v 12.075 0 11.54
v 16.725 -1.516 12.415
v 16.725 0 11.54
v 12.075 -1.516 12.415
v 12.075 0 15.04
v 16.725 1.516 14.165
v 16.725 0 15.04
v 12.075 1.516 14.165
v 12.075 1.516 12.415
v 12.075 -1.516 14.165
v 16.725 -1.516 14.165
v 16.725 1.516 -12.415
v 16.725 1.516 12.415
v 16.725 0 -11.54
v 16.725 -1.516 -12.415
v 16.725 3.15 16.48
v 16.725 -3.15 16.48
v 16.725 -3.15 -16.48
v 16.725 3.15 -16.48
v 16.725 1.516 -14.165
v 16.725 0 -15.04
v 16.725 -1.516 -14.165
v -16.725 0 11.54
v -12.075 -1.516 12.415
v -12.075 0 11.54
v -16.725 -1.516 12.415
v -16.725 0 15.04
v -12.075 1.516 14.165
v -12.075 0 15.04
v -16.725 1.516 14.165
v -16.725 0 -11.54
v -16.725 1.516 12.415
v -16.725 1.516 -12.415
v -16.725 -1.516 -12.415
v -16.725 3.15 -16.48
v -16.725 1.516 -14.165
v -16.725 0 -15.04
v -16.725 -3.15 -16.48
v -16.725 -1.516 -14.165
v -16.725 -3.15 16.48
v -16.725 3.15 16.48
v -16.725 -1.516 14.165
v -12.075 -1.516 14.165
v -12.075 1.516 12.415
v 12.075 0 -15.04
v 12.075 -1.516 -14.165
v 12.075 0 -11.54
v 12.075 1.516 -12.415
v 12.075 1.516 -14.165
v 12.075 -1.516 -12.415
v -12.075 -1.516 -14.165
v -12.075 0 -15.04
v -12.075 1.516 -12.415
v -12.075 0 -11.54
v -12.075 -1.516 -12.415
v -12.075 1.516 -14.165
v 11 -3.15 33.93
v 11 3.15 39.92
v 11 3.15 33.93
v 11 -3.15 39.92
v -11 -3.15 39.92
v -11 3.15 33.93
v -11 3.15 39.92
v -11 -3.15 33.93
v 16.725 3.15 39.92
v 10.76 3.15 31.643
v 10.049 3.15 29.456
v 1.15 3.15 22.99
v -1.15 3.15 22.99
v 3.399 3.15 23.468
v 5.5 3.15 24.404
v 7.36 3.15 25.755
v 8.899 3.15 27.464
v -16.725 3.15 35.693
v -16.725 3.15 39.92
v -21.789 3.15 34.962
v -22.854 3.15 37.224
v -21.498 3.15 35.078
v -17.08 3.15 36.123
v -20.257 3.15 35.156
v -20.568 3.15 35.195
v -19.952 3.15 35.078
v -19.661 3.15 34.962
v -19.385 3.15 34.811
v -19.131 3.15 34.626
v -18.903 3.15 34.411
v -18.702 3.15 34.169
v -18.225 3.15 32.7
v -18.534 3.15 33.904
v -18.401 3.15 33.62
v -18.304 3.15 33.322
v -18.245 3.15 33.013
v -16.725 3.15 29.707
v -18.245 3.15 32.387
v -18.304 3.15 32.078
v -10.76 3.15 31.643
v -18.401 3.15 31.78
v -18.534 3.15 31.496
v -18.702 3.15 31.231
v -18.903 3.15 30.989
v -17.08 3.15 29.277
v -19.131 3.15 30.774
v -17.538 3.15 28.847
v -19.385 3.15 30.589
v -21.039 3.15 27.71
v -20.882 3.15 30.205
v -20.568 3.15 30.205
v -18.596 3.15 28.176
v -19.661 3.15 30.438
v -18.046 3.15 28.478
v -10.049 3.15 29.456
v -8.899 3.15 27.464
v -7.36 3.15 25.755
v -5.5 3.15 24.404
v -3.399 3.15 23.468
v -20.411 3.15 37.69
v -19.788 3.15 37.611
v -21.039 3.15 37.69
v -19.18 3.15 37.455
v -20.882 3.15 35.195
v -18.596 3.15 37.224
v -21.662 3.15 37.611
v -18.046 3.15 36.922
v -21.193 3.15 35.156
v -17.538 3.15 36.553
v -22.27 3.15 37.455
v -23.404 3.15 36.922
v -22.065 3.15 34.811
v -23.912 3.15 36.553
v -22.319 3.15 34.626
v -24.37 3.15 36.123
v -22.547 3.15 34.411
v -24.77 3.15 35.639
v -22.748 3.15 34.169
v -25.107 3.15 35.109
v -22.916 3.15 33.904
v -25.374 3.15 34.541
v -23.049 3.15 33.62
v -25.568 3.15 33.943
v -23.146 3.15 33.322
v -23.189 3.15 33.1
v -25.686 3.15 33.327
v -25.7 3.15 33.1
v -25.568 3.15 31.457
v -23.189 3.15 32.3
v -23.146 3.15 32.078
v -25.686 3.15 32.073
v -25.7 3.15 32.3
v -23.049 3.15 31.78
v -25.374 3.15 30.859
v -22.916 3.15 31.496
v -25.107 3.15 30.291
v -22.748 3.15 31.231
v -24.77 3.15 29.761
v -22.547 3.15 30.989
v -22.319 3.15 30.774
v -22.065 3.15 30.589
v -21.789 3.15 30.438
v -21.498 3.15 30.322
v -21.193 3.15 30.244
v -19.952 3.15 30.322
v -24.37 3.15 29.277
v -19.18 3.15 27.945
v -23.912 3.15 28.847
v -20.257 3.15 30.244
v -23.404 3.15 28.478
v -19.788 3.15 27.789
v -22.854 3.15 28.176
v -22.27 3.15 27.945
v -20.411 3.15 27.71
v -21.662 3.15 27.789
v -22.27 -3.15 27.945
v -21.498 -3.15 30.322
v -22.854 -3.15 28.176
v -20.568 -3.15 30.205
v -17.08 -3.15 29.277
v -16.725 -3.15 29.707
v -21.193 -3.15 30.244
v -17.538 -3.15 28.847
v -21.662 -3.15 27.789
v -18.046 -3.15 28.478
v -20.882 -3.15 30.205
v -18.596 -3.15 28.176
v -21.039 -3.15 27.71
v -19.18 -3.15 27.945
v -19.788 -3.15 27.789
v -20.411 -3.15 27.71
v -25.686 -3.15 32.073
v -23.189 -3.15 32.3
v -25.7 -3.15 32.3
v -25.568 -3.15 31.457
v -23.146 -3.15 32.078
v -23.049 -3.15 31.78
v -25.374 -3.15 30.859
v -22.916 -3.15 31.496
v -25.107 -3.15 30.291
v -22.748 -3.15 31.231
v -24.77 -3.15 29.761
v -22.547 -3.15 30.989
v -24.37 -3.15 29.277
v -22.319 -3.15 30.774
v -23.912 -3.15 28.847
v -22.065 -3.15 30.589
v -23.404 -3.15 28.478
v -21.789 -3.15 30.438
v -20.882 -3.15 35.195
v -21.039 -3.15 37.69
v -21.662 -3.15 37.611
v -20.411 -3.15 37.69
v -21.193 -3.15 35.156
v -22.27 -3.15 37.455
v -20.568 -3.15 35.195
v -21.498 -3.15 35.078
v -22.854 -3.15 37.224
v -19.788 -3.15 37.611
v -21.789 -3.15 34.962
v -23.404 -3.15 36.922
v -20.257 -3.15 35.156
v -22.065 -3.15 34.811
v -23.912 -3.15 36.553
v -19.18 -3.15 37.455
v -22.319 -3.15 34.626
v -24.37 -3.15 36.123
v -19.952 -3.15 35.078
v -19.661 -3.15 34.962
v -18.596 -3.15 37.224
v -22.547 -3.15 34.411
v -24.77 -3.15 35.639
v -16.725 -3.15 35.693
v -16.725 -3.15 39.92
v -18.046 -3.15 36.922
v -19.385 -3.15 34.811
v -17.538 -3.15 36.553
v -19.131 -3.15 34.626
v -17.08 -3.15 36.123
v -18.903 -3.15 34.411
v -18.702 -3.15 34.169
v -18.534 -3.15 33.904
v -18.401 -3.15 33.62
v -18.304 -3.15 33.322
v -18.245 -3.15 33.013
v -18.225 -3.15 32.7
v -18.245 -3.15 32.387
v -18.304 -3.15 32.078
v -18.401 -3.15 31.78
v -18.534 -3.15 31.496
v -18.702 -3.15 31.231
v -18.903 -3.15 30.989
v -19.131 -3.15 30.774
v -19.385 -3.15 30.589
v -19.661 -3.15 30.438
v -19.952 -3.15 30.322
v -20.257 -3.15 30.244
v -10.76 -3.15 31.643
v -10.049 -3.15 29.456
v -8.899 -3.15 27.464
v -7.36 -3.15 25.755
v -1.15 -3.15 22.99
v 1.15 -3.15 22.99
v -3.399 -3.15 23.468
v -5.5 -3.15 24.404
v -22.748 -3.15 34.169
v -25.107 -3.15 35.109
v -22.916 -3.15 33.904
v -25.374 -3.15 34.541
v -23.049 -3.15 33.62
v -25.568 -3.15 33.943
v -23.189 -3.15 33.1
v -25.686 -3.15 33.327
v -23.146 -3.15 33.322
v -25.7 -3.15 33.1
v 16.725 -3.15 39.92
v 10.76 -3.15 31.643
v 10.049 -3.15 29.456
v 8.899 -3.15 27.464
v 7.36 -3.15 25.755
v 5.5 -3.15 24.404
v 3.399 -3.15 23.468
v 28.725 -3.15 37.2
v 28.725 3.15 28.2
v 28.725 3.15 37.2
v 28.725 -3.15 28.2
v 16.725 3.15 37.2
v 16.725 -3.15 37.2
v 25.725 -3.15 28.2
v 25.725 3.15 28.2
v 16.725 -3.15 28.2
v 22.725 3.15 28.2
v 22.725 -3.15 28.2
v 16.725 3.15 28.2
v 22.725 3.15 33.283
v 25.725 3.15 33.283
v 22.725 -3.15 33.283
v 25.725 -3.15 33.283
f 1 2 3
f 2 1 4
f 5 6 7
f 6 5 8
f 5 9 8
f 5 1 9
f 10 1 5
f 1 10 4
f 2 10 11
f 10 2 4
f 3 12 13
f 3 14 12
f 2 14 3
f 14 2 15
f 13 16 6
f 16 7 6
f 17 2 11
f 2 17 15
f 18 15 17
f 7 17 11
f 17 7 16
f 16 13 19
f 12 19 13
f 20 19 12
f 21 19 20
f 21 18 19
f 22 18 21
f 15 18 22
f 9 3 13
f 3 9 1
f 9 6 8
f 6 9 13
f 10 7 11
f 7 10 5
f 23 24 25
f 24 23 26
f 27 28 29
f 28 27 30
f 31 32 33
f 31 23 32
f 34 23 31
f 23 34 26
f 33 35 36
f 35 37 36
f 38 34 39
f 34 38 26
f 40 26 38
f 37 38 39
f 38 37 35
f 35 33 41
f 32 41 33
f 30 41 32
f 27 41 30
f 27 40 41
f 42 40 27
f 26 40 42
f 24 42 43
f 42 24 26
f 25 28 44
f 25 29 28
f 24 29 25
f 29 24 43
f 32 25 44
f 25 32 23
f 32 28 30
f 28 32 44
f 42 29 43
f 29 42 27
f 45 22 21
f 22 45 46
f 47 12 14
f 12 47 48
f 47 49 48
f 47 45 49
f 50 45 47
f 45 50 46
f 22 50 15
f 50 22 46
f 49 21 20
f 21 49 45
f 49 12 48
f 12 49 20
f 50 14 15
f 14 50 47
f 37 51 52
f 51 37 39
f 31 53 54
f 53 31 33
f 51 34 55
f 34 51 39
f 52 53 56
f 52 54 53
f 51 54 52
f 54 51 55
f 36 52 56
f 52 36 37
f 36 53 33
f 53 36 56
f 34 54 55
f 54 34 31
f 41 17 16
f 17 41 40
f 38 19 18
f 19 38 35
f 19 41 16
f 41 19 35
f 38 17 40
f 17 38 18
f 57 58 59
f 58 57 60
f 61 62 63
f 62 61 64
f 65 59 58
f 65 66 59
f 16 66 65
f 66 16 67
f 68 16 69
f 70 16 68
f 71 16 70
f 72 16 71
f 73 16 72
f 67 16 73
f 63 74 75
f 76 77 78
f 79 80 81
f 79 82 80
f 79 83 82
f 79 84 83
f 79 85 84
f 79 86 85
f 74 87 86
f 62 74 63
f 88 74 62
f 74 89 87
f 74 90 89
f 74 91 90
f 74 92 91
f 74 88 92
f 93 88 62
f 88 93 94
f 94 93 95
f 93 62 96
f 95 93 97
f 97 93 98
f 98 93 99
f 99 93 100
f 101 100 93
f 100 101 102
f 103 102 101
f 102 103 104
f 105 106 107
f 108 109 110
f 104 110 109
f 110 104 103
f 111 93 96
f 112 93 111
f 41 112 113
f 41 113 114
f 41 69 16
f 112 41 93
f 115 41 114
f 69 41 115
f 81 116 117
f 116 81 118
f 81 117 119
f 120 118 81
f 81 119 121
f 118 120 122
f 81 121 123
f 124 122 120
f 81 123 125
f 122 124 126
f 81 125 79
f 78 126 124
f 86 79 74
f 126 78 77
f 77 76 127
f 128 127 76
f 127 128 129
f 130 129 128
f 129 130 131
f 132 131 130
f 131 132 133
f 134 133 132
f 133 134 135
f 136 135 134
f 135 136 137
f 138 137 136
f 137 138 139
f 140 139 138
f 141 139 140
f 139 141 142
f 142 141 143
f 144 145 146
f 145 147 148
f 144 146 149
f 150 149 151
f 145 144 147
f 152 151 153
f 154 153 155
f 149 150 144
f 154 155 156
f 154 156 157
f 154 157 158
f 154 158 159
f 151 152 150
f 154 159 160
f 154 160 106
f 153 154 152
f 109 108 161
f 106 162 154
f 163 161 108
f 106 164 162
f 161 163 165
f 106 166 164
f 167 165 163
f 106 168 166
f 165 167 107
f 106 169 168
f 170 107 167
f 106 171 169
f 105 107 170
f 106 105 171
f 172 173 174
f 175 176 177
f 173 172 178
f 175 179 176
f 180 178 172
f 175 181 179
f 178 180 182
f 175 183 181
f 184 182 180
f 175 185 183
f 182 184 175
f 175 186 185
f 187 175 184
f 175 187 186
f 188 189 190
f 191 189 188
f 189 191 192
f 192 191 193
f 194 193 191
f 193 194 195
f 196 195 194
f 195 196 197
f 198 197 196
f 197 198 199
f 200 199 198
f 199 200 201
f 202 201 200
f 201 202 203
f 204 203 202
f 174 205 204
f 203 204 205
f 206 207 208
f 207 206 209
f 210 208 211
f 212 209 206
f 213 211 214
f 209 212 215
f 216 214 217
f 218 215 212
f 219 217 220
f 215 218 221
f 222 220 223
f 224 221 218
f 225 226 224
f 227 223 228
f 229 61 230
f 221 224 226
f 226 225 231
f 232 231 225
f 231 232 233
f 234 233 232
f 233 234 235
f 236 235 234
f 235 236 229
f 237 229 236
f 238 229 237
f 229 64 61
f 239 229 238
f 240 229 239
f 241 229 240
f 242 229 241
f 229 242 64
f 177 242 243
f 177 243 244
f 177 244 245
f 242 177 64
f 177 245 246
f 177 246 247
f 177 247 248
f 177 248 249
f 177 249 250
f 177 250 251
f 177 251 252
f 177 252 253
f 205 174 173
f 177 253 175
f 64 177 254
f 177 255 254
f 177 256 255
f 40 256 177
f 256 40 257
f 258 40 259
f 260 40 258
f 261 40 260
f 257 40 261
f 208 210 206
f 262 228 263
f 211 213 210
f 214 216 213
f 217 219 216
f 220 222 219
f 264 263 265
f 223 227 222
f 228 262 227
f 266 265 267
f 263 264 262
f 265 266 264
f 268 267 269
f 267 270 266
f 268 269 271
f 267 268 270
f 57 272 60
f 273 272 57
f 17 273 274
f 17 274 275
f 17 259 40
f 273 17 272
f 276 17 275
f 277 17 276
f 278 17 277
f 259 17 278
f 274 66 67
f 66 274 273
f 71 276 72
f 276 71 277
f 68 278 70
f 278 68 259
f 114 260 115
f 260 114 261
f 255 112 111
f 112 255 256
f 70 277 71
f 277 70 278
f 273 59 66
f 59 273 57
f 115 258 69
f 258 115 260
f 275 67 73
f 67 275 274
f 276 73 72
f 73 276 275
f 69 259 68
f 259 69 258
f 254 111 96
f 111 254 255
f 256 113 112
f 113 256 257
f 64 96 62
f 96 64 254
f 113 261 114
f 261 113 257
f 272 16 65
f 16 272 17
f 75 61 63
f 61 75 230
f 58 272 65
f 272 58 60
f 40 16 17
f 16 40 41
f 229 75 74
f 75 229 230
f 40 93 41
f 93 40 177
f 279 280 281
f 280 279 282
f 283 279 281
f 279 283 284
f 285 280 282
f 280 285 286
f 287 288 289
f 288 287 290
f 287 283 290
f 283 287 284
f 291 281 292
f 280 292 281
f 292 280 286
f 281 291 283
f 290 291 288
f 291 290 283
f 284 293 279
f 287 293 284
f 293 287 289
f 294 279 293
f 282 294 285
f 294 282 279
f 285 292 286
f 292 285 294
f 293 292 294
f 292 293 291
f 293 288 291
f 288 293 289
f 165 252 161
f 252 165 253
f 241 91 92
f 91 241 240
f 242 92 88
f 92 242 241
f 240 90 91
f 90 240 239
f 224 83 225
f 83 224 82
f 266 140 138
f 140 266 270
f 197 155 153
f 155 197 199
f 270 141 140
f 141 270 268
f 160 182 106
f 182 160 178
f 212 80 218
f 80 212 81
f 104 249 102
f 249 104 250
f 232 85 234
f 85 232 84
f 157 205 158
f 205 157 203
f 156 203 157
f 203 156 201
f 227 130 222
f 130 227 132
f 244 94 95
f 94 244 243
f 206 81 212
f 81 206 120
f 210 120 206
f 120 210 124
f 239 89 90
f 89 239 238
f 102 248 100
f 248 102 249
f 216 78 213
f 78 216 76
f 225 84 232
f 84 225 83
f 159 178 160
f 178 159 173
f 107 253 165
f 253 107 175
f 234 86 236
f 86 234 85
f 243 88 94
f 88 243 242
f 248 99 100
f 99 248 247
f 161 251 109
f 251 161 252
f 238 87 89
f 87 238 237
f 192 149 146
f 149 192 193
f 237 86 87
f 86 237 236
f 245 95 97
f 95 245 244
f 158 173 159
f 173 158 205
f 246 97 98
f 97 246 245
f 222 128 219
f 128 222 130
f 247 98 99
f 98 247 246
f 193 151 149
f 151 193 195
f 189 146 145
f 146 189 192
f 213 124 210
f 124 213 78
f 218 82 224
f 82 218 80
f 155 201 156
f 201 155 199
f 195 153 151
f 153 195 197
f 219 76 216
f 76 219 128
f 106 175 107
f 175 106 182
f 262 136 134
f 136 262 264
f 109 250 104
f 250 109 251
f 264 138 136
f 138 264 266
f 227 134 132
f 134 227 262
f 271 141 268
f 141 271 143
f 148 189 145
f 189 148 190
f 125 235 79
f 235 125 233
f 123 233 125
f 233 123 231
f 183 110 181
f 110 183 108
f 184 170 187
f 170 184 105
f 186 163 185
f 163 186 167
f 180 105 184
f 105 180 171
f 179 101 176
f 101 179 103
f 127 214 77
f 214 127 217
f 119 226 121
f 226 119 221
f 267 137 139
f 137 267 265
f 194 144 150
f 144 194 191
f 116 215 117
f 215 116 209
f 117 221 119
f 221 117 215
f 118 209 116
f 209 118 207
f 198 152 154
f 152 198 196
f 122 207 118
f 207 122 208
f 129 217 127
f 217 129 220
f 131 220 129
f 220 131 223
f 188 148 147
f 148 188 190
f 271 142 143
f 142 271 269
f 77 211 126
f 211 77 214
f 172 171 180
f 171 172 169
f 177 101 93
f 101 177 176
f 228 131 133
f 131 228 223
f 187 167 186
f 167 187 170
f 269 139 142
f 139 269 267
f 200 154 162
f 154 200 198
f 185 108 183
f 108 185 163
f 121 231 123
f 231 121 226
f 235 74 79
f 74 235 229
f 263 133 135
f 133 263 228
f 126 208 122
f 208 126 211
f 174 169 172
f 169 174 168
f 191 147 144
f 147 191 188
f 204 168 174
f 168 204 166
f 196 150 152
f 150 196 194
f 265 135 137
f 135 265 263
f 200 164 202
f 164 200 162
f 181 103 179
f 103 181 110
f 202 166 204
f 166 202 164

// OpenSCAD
pumpHolderWidth=50.25;
pumpHolderHeight=38.17;
pumpHolderThickness=10.15;


semiCircleDiameter=22; //16.36;
semiCircleRadius=semiCircleDiameter/2;

semiCircleHeight=26.54;
semiCircleThickness=7.23;


//difference(){
//    cube([pumpHolderWidth,pumpHolderThickness,pumpHolderHeight],center=true);
//
//    translate([0,(pumpHolderThickness/2)-(semiCircleThickness/2)+.001,(pumpHolderHeight/2) - (semiCircleHeight/2)]) color("red") union(){
//    rotate([90,0,0]) cylinder(h=pumpHolderThickness+5,r=semiCircleRadius, center=true);
//
//    color("red") translate([0,0,(semiCircleHeight/2)/2]) cube([semiCircleDiameter,pumpHolderThickness+5,semiCircleHeight/2],center=true);
//    }
//}

recHeight=32.96;
recWidth=33.45;
recThickness=6.3;

sideScrewDiameter=3.5;
sideScrewRadius=sideScrewDiameter/2;
sideScrewDepth=4.65;



cubeShape=6.38;


topPlateHeight= 23.44;//1.45;
topPlateOffset = 1.45;

module sideScrew(){
    cylinder(h=sideScrewDepth,r=sideScrewRadius,center=true);
}

module makeFourSideScrews(){
union(){
color("red") translate([(recWidth/2)-(sideScrewDepth/2),0,(recHeight/2) - (cubeShape/2)]) rotate([0,090,0]) sideScrew();
color("red") translate([-((recWidth/2)-(sideScrewDepth/2)),0,(recHeight/2) - (cubeShape/2)]) rotate([0,090,0]) sideScrew();

color("red") translate([((recWidth/2)-(sideScrewDepth/2)),0,-((recHeight/2) - (cubeShape/2))]) rotate([0,090,0]) sideScrew();
color("red") translate([-((recWidth/2)-(sideScrewDepth/2)),0,-((recHeight/2) - (cubeShape/2))]) rotate([0,090,0]) sideScrew();   
}

}




module endPieceBlock(){
difference(){
cube([recWidth,recThickness,recHeight],center=true);
makeFourSideScrews();
}
}


hookWidth=12;//7.40;
hookHeight=7;
hookThickness=5;

stopperWidth=(1/2)*hookWidth;
stopperHeight=(1/2)*hookHeight;


module recStopper(){
//difference(){
//    //hookHeight+2
//cube([hookWidth,recThickness,hookHeight+2],center=true);
//
//translate([(stopperWidth/2) + (hookWidth/2)-(stopperWidth),0,-stopperHeight/2]) union(){
//cube([stopperWidth,recThickness,stopperHeight],center=true);
//color("blue") translate([-((1/2)*stopperWidth)/2,0,2*((stopperHeight-1)/2)]) cube([(1/2)*stopperWidth,hookThickness,stopperHeight-1],center=true);
//}
//}

difference(){
cube([hookWidth,recThickness,hookHeight+2],center=true);
    translate([1.5,0,-(hookHeight/1.5)/2]) cube([hookWidth/4,recThickness,hookHeight/1.2],center=true);
}
}




module circleStopper(){
difference(){
rotate([90,0,0]) cylinder(h=recThickness,r=5,center=true,$fn=50);
union(){
rotate([90,0,0]) cylinder(h=recThickness,r=2.5,center=true,$fn=50);
translate([-(2.5/2)-(2.5),0,0]) cube([2.5+.1,recThickness,0.8],center=true);
}
}
}

module pumpHolder(){
translate([0,0,(topPlateHeight/2) + recHeight/2]) union(){
difference(){
    color("red") cube([recWidth,recThickness,topPlateHeight],center=true);

translate([0,0,-(topPlateHeight/2)+(semiCircleRadius) +topPlateOffset+5]) union(){
translate([0,0, semiCircleRadius/2]) cube([semiCircleDiameter,recThickness,semiCircleRadius],center=true); //topPlateHeight/2+5
rotate([90,0,0]) cylinder(h=recThickness,r=semiCircleRadius,center=true);
}

}
union(){
translate([(hookWidth/2)+(recWidth/2),0,((hookHeight+2)/2)]) recStopper();

translate([-5 - (recWidth/2) +1,0,((hookHeight+2)/2)]) circleStopper();
}
}
}



module endPiece(){
    union(){
        endPieceBlock();
        pumpHolder();
    }
}

endPiece();


//difference(){
//    //hookHeight+2
//%cube([hookWidth,recThickness,hookHeight+2],center=true);
//
//translate([(stopperWidth/2) + (hookWidth/2)-(stopperWidth),0,-stopperHeight/2]) union(){
//%cube([stopperWidth,recThickness,stopperHeight],center=true);
////color("blue") translate([-((1/2)*stopperWidth)/2,0,2*((stopperHeight-1)/2)]) 
//    color("blue") cube([(1/2)*stopperWidth,hookThickness,stopperHeight-1],center=true);
//}
//}



//translate([stopperWidth/2,0,-((hookHeight+2)/4)]) %cube([stopperWidth,recThickness,(hookHeight+2)/2],center=true);
////color("blue") translate([-((1/2)*stopperWidth)/2,0,2*((stopperHeight-1)/2)]) 
//    color("blue") cube([(1/2)*stopperWidth,hookThickness,stopperHeight-1],center=true);
